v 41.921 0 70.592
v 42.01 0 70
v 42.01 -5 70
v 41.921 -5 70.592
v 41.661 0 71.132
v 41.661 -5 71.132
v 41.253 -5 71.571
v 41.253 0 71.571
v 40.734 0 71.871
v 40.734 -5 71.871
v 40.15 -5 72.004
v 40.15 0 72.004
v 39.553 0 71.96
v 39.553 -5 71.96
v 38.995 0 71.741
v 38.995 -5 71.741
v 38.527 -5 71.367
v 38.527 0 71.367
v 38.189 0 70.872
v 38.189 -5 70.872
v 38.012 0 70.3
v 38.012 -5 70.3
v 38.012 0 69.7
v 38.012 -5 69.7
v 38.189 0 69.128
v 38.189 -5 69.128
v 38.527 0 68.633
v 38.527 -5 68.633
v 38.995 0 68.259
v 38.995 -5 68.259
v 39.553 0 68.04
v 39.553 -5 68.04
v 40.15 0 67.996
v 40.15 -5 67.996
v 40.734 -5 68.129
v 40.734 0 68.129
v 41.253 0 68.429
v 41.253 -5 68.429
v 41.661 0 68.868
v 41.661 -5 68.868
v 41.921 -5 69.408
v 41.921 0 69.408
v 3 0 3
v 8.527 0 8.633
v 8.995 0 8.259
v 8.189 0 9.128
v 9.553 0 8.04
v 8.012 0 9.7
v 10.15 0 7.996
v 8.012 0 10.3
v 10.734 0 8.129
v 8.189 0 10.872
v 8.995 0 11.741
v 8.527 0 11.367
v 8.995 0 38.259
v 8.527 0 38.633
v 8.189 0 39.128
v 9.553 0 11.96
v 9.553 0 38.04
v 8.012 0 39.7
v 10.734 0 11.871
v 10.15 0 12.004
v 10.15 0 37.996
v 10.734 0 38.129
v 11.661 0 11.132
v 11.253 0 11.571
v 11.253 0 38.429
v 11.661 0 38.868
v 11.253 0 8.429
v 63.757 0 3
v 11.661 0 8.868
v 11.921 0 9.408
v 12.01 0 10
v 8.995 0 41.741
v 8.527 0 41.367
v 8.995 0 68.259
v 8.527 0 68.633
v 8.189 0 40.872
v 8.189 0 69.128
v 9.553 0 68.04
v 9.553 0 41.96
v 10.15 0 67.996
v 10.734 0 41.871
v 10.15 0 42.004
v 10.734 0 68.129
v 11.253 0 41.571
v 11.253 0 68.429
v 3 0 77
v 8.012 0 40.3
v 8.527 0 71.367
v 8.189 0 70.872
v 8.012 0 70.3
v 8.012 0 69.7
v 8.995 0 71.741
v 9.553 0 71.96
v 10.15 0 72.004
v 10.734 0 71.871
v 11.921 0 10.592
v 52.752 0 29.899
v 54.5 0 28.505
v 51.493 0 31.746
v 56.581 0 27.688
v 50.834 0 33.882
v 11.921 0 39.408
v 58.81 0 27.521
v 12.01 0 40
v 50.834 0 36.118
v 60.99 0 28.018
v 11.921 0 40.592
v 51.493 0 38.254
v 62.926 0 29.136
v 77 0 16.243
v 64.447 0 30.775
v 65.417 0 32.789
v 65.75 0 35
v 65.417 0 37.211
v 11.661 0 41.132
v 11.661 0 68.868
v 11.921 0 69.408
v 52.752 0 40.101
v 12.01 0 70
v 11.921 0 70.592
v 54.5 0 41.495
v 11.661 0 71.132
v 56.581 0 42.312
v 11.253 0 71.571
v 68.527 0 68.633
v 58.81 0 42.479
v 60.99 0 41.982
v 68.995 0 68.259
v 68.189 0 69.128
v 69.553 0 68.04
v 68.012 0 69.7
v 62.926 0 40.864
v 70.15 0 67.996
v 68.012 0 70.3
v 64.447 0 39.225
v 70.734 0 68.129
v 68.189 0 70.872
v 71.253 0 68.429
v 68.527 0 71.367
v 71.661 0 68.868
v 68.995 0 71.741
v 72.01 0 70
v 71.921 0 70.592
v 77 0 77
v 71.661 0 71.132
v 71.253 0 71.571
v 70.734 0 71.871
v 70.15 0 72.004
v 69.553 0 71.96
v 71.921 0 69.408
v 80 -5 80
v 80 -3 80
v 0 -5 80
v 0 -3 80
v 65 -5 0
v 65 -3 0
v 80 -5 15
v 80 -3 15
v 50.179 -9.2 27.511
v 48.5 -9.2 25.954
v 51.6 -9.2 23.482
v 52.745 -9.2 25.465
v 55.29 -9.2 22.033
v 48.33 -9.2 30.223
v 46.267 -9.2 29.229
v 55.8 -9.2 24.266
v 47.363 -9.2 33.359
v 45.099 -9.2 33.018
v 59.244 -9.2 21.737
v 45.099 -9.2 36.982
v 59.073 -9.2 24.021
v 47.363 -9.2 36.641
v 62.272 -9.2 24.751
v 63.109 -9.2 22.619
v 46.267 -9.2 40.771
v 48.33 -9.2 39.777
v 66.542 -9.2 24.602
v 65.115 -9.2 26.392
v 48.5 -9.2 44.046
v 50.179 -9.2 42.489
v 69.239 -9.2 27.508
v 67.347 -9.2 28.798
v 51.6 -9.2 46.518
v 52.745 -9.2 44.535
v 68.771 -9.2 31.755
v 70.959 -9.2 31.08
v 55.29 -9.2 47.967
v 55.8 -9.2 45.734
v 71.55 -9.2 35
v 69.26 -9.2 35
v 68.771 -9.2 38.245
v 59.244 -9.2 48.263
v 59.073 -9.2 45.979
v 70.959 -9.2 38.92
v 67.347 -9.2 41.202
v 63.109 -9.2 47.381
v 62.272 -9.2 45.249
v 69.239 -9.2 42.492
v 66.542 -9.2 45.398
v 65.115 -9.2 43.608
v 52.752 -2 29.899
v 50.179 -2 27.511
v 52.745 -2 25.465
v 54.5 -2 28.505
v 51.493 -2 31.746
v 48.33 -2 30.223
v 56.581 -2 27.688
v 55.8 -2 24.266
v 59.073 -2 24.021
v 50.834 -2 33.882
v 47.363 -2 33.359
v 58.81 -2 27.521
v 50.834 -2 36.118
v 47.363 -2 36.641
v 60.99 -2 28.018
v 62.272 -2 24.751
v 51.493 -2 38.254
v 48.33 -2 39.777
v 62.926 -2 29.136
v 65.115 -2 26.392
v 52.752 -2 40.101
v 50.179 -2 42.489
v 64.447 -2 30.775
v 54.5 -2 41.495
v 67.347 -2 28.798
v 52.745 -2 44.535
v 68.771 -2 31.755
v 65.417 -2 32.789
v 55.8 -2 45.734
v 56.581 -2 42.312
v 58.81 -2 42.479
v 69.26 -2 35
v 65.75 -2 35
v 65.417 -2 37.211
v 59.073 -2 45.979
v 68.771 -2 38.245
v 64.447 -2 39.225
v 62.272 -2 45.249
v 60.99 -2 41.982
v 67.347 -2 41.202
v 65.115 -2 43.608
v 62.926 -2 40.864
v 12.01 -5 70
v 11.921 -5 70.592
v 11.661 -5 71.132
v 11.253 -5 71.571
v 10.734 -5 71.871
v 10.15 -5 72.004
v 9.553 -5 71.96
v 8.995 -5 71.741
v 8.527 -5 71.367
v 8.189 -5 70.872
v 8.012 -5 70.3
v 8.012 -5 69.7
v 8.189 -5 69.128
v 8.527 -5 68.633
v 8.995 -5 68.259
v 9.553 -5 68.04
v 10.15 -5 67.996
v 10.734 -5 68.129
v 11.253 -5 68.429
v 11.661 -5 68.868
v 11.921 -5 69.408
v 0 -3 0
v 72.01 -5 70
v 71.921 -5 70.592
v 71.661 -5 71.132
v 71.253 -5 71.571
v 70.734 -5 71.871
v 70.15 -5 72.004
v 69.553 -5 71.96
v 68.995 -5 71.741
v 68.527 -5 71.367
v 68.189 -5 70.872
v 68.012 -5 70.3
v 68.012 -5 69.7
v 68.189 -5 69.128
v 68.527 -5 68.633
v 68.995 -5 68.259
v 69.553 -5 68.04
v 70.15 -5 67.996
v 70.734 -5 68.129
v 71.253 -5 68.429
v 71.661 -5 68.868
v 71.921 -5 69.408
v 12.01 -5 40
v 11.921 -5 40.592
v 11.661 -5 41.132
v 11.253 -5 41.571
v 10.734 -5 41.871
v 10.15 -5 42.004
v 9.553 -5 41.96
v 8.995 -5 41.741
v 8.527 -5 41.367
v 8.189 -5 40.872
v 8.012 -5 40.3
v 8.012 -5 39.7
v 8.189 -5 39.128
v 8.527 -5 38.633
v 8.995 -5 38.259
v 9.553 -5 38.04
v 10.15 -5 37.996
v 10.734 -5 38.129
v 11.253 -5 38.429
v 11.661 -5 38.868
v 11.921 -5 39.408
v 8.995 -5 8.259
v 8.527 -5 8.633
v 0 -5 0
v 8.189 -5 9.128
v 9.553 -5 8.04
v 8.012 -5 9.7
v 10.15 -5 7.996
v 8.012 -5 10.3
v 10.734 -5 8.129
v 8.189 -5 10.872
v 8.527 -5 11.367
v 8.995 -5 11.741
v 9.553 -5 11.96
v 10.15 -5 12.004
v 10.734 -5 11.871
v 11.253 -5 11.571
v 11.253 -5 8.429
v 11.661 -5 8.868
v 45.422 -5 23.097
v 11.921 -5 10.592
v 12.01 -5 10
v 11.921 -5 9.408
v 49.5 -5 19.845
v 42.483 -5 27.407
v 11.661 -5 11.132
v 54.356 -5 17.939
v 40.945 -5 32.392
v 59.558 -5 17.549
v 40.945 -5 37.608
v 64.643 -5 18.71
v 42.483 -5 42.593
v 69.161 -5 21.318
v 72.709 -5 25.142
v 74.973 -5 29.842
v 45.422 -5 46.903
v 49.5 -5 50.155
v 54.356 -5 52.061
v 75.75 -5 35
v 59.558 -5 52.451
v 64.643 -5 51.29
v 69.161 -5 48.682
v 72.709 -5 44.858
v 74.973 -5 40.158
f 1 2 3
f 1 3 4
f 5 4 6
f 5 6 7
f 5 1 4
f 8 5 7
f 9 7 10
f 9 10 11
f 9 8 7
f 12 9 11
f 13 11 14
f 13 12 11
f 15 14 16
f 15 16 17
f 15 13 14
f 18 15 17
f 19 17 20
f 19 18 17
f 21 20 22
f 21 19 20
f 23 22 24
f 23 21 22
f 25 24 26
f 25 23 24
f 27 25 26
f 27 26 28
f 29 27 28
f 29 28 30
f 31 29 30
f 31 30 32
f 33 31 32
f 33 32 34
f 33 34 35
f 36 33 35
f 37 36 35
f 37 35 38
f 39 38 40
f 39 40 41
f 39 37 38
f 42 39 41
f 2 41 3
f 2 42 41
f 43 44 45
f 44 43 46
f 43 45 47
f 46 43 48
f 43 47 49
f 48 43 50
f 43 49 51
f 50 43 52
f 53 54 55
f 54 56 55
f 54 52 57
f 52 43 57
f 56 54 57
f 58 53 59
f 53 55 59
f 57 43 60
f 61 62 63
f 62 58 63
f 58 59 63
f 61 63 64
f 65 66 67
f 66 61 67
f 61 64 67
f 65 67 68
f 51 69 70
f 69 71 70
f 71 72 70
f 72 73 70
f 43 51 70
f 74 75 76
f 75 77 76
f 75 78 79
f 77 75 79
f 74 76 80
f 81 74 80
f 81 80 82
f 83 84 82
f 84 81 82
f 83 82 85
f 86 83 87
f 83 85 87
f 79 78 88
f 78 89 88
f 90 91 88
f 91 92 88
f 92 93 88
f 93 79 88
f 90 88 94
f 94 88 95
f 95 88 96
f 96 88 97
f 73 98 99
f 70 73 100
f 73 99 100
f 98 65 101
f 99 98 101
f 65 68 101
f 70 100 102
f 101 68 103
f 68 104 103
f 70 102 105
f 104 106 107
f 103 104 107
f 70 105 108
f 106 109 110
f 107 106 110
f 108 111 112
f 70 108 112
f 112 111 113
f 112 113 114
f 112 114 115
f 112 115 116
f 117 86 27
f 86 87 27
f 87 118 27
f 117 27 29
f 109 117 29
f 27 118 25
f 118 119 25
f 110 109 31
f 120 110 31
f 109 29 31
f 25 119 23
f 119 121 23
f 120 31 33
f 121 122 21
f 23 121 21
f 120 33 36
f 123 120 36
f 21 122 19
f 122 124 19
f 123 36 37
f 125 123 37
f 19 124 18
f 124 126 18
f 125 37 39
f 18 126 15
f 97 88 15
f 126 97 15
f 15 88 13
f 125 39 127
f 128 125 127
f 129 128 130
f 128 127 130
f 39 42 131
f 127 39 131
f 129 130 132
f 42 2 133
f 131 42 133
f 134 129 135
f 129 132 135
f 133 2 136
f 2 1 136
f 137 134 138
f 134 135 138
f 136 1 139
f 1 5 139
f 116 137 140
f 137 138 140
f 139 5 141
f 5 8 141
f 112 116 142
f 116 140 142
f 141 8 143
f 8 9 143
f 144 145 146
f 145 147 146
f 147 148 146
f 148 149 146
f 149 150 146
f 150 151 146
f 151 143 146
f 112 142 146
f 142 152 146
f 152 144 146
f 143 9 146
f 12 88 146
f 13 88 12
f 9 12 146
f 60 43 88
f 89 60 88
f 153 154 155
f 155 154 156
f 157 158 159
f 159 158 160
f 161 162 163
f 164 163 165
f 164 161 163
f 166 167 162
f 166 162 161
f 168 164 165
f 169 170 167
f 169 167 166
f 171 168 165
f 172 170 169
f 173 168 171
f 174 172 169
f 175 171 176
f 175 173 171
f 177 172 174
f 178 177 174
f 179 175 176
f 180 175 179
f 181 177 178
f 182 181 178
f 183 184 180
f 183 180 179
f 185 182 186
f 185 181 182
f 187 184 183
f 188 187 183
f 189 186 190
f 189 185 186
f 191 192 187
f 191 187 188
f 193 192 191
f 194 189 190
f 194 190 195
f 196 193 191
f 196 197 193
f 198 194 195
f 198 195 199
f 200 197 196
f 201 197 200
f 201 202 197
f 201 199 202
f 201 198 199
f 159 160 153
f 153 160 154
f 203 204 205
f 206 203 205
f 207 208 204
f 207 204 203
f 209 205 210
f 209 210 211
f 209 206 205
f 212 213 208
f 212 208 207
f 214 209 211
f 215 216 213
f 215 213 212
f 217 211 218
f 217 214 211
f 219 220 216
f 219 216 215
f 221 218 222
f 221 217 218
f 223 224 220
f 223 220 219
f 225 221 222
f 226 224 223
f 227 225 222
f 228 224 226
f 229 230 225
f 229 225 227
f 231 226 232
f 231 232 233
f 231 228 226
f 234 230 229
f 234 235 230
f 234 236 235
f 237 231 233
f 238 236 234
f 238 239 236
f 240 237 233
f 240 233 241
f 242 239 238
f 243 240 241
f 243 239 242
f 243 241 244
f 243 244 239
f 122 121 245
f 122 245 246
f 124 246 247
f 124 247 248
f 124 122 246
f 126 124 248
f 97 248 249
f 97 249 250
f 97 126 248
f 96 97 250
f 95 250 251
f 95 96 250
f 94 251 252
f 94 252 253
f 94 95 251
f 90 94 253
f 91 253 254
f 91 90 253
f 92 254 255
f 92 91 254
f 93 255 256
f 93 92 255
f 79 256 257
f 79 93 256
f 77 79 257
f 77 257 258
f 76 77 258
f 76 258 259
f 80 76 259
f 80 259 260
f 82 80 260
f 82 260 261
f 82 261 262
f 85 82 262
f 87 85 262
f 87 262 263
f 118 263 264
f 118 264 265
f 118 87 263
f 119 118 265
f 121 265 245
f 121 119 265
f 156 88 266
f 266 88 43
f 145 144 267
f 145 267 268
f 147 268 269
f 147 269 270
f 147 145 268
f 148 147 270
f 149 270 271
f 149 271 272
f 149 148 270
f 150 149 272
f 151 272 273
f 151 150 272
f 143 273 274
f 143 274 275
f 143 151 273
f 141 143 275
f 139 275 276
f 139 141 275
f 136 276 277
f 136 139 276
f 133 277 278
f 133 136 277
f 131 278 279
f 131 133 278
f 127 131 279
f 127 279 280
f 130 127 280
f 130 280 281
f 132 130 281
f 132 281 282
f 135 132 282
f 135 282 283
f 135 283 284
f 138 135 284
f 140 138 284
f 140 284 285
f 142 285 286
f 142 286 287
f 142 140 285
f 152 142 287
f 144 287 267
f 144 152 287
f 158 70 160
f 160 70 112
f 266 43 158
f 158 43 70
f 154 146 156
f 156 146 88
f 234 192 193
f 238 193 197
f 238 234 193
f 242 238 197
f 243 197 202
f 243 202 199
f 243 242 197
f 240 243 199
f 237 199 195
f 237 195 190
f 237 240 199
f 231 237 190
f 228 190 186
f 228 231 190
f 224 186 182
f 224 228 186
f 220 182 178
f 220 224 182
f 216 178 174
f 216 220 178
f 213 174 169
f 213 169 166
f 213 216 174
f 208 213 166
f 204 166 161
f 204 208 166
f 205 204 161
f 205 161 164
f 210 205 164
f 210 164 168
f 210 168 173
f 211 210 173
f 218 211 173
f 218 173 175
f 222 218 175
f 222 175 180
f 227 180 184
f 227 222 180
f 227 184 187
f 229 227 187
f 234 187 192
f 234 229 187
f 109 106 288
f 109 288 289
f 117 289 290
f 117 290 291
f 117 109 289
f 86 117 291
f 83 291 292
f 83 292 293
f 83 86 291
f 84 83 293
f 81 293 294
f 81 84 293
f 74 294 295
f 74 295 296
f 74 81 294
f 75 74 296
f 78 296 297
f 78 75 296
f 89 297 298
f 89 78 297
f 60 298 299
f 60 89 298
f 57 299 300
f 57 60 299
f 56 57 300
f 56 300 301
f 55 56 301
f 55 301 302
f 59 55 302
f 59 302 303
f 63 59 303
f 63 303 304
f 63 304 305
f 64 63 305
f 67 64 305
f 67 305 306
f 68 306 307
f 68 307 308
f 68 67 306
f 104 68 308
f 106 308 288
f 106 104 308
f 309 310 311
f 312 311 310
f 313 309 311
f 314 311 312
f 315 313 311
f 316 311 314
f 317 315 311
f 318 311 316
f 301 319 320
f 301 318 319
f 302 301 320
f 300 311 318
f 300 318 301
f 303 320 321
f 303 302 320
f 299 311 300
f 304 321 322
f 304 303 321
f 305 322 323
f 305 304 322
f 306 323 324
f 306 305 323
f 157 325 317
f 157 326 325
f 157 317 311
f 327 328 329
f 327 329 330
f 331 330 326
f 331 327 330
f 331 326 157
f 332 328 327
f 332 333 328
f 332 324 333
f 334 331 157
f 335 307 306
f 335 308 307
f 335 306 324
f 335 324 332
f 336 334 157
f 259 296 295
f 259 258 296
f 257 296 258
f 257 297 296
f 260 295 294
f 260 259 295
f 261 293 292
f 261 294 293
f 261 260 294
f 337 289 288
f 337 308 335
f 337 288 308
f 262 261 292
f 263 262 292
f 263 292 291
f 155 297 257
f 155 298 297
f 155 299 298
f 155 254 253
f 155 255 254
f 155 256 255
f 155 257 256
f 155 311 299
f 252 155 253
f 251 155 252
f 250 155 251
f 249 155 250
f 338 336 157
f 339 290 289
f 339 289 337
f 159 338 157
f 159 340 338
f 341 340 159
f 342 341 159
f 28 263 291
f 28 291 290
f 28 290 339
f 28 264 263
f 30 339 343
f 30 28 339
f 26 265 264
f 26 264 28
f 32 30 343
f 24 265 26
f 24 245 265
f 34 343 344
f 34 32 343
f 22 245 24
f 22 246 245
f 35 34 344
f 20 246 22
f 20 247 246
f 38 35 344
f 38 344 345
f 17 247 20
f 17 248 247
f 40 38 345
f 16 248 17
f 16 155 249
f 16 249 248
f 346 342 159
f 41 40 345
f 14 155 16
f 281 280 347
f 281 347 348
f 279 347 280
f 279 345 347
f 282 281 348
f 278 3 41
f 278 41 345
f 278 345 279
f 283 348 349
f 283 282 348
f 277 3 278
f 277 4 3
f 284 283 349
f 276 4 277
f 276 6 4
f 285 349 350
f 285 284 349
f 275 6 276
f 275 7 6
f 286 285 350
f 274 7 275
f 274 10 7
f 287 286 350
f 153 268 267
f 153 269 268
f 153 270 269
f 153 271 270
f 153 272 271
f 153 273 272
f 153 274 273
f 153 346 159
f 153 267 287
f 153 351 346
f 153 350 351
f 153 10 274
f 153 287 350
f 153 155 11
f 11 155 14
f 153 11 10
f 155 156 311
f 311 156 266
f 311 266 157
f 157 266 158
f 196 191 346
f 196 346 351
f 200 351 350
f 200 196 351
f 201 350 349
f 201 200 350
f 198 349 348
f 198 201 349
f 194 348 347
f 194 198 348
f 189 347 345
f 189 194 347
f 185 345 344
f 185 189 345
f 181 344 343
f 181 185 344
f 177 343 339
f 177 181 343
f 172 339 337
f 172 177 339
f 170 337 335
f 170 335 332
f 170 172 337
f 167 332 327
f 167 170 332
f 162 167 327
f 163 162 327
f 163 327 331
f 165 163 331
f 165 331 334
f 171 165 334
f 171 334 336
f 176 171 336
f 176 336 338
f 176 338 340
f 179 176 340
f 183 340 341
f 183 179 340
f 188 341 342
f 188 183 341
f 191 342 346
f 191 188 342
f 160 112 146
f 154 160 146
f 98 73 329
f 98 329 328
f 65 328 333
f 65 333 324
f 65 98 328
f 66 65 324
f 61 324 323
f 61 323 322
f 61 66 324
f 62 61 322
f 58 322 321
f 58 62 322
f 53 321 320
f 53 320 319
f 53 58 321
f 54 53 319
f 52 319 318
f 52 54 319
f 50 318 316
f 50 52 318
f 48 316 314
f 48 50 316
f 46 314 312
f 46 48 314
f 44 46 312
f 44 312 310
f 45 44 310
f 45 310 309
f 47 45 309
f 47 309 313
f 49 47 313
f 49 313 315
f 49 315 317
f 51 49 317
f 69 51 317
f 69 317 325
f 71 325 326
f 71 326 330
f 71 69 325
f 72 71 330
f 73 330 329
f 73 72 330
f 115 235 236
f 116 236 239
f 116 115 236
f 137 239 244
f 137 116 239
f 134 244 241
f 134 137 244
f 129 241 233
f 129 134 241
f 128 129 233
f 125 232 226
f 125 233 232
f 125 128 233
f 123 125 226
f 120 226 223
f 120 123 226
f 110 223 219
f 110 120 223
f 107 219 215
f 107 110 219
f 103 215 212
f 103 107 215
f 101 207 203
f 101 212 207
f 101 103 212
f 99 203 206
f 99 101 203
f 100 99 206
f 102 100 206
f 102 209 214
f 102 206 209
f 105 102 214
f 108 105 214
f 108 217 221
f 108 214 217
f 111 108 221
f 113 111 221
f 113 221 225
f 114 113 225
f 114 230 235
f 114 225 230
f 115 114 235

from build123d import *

# Parameters (mm, degrees)
F0_R     = 2.01
F0_R_2   = 7.5
F1_DEPTH = 5
F2_R     = 11.01
F3_DEPTH = 3
F4_R     = 17.5
F4_R_2   = 11.01
F5_DEPTH = 4.2
F6_SIZE  = 4.19999
F7_SIZE  = 3


# Not quite as in the source:
# - a fillet or chamfer is up to 0.001 mm smaller than in the source, because OpenCascade refuses the exact size


with BuildPart() as f1:
    # F0 (on Front) → F1 (new body)
    with BuildSketch(Plane.XZ):
        Polygon((0, 80), (0, 0), (65, 0), (80, 15), (80, 80), align=None)
        with Locations((10, 10)):
            Circle(F0_R, mode=Mode.SUBTRACT)
        with Locations((58.25, 35)):
            Circle(F0_R_2, mode=Mode.SUBTRACT)
        with Locations((10, 40)):
            Circle(F0_R, mode=Mode.SUBTRACT)
        with Locations((10, 70)):
            Circle(F0_R, mode=Mode.SUBTRACT)
        with Locations((40, 70)):
            Circle(F0_R, mode=Mode.SUBTRACT)
        with Locations((70, 70)):
            Circle(F0_R, mode=Mode.SUBTRACT)
    extrude(amount=F1_DEPTH)

    # F2 (on face) → F3 (cut)
    with BuildSketch(Plane.XZ.offset(5)):
        with Locations((58.25, 35)):
            Circle(F2_R)
    extrude(amount=-F3_DEPTH, mode=Mode.SUBTRACT)

    # F4 (on face) → F5 (join)
    with BuildSketch(Plane.XZ.offset(5)):
        with Locations((58.25, 35)):
            Circle(F4_R)
        with Locations((58.25, 35)):
            Circle(F4_R_2, mode=Mode.SUBTRACT)
    extrude(amount=F5_DEPTH)

    # F6 (size 4.2 in the source; OpenCascade refuses exactly that, so slightly less here)
    f6_edges = [f1.edges().sort_by_distance(p)[0] for p in [
        (40.75, -9.2, 35),
    ]]
    chamfer(f6_edges, length=F6_SIZE)

    # F7
    f7_edges = [f1.edges().sort_by_distance(p)[0] for p in [
        (40, 0, 80),
        (80, 0, 47.5),
        (72.5, 0, 7.5),
        (0, 0, 40),
        (32.5, 0, 0),
    ]]
    chamfer(f7_edges, length=F7_SIZE)


with BuildPart() as f8_1:
    # F8: copy of F1
    add(f1.part)


solid = f1.part
